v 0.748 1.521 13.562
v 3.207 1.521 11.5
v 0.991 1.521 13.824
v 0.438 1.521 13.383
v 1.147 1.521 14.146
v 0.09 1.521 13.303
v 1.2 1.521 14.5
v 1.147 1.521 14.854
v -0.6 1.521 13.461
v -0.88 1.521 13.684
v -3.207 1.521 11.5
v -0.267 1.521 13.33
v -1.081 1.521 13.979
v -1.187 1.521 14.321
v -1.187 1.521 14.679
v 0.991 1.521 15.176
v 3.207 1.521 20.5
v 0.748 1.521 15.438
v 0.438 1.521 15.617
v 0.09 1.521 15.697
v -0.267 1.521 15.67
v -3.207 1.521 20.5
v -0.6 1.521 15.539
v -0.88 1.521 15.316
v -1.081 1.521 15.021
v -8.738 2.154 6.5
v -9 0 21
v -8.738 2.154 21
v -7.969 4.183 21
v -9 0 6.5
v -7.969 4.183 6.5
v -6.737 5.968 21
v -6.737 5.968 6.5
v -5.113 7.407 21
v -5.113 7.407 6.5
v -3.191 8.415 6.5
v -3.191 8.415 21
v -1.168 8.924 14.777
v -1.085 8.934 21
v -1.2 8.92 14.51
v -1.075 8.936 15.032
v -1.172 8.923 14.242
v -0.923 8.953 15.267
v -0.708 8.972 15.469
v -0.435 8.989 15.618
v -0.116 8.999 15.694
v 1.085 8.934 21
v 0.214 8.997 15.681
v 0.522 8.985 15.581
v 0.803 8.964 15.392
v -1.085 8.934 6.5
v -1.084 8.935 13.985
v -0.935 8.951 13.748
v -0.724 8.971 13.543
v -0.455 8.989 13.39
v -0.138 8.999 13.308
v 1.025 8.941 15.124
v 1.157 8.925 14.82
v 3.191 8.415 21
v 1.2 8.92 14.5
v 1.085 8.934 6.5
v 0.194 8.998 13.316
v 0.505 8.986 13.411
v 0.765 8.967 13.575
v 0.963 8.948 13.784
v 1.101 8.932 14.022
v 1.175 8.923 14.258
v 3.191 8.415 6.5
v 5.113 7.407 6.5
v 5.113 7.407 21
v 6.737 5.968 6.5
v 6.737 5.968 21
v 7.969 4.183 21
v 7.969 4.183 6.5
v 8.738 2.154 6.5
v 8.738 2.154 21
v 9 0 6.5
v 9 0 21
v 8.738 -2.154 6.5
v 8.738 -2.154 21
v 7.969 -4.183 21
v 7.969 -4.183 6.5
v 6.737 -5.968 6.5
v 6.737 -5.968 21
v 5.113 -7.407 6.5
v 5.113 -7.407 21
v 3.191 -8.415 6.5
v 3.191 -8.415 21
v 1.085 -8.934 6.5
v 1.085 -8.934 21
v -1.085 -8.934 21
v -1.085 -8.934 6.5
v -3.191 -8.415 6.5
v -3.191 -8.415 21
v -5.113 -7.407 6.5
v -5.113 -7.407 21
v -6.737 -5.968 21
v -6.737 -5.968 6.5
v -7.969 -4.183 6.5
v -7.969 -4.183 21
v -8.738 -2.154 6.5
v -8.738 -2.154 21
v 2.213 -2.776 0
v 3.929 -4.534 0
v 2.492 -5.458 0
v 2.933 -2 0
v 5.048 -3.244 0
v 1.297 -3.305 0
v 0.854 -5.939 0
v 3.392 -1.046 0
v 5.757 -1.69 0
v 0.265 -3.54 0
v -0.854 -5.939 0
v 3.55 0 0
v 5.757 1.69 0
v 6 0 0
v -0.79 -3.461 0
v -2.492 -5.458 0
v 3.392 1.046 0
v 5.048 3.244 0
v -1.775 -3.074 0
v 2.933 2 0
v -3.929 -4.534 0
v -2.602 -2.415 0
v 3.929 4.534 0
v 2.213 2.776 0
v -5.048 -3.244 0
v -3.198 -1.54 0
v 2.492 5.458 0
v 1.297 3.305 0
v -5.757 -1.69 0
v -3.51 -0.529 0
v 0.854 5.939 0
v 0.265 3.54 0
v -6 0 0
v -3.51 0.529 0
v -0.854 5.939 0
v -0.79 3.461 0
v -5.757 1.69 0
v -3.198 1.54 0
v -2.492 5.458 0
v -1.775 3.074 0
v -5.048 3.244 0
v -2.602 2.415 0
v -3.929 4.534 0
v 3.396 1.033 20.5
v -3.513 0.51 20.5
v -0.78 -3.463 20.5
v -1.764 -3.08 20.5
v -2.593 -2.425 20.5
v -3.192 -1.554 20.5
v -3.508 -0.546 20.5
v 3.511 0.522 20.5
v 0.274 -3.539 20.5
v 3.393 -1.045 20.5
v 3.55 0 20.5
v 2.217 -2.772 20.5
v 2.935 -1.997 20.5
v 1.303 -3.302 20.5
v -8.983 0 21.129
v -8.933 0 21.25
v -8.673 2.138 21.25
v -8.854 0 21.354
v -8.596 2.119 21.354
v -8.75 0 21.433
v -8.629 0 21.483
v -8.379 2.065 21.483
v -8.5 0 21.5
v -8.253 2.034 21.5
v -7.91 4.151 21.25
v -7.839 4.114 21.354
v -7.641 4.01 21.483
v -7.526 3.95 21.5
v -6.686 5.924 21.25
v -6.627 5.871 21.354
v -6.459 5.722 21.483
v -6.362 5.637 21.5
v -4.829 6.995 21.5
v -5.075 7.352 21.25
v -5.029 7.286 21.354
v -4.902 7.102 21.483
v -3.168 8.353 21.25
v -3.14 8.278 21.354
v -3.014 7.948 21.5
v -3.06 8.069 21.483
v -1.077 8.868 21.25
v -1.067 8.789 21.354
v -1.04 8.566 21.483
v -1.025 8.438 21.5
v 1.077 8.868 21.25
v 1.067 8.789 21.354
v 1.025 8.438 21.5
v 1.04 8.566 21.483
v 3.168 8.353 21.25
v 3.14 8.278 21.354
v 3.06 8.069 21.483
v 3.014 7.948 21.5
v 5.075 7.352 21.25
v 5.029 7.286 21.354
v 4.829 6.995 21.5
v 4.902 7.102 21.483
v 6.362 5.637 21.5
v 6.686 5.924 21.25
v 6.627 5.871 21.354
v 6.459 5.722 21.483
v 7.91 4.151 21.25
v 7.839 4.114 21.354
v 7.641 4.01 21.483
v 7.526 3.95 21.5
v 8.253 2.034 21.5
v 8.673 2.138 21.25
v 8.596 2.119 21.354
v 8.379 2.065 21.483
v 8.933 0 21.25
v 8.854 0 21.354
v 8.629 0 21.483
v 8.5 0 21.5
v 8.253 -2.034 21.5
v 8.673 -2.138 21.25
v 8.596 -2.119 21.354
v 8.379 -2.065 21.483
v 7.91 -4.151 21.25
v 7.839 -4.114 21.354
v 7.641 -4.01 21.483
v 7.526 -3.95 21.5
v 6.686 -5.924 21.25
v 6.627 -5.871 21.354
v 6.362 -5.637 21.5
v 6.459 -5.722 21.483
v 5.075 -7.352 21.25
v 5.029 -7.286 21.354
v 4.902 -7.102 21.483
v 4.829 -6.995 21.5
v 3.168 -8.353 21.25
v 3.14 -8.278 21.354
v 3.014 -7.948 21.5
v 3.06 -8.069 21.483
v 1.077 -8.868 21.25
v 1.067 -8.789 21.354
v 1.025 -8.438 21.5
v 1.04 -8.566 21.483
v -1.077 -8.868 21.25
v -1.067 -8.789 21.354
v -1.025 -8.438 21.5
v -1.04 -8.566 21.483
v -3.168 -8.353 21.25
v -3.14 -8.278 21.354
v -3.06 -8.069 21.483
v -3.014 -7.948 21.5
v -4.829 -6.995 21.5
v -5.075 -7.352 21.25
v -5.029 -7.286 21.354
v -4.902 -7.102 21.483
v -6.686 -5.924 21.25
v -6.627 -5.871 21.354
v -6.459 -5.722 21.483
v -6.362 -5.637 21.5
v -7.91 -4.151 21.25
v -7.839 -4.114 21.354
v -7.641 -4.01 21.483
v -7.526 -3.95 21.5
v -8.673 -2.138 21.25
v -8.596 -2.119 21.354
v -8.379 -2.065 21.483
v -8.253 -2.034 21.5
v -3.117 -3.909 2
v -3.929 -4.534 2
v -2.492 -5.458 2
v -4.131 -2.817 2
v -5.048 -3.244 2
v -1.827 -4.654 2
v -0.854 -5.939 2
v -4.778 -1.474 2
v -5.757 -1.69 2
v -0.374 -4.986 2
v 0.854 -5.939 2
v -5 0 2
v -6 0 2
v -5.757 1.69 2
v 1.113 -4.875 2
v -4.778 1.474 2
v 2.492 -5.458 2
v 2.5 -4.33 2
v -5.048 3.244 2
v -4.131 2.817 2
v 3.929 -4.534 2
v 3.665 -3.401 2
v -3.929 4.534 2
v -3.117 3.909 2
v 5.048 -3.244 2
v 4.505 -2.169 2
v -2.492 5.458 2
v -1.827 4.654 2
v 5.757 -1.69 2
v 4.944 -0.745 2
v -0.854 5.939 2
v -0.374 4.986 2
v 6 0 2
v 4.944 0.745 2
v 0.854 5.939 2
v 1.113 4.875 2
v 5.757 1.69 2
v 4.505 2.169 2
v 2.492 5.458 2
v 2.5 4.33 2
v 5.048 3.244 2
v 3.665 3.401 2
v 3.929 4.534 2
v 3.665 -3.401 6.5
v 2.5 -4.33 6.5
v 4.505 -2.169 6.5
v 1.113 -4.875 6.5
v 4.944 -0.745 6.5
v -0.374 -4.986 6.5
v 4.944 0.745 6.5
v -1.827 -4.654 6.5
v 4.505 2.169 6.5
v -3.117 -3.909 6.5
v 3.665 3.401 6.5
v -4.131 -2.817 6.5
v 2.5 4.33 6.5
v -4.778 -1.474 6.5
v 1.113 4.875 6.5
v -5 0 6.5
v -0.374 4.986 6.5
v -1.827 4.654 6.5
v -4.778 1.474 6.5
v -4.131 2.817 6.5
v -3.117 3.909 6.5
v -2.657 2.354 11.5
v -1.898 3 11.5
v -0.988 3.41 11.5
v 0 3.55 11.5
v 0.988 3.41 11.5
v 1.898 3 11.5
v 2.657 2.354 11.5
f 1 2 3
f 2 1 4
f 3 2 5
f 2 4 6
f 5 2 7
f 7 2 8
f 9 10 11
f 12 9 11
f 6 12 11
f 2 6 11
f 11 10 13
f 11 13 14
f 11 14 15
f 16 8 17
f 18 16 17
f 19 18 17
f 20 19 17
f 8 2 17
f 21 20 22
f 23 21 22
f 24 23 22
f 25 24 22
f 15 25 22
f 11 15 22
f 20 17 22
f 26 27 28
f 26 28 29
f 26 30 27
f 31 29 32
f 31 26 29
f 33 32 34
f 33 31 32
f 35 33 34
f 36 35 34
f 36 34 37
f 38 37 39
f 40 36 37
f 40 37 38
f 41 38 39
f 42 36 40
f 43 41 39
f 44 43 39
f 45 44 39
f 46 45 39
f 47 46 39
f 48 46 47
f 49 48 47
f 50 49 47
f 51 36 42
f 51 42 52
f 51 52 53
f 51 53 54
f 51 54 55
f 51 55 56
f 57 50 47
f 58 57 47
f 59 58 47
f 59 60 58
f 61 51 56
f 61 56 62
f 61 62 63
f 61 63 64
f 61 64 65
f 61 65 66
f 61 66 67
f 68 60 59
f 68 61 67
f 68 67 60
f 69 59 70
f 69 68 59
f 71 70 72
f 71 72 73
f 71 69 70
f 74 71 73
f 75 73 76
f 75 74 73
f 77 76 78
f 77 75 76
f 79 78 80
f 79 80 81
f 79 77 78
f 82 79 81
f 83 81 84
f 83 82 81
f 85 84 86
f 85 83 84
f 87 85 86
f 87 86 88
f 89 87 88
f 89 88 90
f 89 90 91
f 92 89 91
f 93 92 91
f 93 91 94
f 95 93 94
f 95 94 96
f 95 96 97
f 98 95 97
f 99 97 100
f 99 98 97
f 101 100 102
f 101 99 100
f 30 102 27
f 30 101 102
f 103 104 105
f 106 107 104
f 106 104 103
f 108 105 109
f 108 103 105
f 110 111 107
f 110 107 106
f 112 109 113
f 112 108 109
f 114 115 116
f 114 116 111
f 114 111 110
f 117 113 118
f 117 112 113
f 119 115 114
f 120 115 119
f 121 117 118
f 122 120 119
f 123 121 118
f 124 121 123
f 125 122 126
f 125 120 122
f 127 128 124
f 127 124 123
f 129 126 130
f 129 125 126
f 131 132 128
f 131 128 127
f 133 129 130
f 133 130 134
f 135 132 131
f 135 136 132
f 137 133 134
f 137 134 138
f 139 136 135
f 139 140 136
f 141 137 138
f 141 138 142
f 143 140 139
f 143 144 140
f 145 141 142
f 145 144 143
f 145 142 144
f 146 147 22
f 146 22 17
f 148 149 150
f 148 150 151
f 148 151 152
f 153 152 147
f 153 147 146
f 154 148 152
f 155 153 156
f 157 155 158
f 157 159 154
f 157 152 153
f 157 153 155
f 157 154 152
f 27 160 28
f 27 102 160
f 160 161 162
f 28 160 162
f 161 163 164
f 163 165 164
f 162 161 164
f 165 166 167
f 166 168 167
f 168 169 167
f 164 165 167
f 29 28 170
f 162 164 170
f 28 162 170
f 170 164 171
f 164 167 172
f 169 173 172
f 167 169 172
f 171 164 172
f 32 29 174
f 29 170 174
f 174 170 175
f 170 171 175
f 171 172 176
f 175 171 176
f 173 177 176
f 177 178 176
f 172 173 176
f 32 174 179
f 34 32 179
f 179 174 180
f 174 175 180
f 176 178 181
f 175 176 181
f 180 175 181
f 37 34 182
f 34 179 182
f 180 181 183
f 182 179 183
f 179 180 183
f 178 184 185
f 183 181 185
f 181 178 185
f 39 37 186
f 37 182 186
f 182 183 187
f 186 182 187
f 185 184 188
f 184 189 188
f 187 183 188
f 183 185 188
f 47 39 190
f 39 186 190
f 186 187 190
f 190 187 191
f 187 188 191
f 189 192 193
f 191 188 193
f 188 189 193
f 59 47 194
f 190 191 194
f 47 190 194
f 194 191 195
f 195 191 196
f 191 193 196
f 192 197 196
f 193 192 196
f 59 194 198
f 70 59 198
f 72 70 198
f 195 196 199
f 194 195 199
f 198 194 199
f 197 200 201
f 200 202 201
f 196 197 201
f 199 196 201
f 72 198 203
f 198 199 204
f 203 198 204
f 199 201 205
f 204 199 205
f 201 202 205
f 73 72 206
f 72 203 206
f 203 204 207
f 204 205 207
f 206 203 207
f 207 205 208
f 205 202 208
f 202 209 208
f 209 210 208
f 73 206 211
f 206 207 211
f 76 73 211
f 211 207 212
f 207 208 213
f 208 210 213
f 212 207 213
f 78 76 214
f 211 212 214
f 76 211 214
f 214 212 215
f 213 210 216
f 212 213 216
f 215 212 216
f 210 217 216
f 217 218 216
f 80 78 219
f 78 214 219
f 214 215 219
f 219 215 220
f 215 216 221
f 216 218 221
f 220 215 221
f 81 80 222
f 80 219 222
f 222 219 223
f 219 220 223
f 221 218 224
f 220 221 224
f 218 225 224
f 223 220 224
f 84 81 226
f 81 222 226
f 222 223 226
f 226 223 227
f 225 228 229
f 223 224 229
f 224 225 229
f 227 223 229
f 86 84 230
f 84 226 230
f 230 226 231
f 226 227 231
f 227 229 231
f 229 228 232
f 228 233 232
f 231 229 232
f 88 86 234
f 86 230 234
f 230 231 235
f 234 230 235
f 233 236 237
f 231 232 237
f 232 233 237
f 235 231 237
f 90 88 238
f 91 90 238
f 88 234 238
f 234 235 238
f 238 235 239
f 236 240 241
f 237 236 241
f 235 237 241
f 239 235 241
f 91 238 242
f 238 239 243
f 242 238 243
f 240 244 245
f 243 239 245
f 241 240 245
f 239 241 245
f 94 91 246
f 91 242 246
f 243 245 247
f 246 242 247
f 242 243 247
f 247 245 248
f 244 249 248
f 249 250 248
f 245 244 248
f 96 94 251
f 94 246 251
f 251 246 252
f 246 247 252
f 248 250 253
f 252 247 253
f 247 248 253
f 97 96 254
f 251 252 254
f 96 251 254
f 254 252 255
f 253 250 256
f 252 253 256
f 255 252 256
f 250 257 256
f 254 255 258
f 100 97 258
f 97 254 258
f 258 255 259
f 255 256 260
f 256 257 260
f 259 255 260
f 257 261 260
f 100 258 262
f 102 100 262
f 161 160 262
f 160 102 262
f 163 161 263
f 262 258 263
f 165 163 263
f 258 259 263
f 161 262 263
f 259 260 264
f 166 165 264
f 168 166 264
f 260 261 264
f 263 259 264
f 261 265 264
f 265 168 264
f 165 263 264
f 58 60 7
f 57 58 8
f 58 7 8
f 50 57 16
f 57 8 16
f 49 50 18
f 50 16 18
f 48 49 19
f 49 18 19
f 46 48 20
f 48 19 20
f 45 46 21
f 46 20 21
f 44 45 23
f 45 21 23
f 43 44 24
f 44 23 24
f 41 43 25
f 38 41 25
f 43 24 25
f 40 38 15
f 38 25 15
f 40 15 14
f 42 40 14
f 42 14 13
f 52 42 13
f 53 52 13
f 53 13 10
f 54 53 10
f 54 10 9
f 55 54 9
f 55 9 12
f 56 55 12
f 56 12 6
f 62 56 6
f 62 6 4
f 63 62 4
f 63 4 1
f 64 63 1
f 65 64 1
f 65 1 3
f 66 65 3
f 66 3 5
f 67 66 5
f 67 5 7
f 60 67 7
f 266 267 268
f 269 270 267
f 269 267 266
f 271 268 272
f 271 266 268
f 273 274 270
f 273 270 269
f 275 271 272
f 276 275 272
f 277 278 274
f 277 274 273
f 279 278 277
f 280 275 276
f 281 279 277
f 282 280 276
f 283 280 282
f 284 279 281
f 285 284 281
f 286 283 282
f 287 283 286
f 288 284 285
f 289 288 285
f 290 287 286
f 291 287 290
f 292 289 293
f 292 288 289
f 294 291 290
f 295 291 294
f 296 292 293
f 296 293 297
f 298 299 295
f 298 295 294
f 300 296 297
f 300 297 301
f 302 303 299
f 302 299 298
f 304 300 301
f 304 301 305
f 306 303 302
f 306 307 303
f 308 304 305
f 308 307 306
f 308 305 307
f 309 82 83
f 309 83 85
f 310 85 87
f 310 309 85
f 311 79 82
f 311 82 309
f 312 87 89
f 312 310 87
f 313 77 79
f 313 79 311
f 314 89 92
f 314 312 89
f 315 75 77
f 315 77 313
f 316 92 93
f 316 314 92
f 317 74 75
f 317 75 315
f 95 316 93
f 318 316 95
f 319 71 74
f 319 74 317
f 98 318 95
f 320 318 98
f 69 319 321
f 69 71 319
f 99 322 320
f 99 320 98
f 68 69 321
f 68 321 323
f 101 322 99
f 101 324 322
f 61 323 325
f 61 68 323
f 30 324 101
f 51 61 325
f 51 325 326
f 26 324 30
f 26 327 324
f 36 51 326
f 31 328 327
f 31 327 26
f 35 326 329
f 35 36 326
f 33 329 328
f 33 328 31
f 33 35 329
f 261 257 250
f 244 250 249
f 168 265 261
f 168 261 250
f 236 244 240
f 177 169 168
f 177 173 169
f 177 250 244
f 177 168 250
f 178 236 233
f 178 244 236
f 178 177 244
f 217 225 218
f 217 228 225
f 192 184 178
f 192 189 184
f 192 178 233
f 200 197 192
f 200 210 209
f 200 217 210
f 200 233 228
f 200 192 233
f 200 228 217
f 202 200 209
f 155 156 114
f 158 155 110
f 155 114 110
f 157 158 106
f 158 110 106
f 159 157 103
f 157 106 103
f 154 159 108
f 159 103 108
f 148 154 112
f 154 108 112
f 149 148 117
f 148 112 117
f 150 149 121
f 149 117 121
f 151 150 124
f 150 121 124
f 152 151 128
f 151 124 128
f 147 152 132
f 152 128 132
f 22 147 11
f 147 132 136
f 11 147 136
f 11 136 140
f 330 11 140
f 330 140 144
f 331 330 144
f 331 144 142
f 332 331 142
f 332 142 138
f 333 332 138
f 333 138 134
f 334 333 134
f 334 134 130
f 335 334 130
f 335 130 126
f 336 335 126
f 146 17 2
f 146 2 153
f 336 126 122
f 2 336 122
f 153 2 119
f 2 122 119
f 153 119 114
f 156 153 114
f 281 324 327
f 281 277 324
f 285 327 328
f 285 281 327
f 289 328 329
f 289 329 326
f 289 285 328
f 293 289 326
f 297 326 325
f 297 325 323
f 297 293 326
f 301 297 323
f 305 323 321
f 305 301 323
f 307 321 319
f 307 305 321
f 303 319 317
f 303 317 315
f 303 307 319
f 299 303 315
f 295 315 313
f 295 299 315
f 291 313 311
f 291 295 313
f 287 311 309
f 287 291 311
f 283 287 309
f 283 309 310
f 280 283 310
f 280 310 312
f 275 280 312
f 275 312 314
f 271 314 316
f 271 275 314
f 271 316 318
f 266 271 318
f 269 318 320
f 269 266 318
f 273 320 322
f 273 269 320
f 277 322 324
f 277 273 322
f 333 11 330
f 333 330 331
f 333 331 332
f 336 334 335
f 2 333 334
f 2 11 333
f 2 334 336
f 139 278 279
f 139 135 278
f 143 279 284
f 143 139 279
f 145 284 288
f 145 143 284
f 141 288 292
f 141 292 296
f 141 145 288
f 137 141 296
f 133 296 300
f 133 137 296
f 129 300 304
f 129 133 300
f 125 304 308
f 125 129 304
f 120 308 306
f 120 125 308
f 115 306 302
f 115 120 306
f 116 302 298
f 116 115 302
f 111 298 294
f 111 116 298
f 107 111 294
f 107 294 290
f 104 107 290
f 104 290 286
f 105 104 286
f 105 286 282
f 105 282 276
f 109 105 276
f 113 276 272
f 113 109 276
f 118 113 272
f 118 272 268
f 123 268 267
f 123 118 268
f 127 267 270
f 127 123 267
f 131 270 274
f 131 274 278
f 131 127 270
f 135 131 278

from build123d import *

# Parameters (mm, degrees)
F2_R     = 3.55
F3_DEPTH = 20.5
F5_DEPTH = 9
F6_R     = 0.5
F7_R     = 1.2
F8_DEPTH = 25


with BuildPart() as f1:
    # F0 (on Front) → F1 (revolve)
    with BuildSketch(Plane.XZ):
        Polygon((-6, 0), (0, 0), (0, 21.5), (-9, 21.5), (-9, 6.5), (-5, 6.5), (-5, 2), (-6, 2), align=None)
    revolve(axis=Axis((0, 0, -3.667768), (0, 0, -1)))

    # F2 (on face) → F3 (cut)
    with BuildSketch(Plane(origin=(0, 0, 0), x_dir=(1, 0, 0), z_dir=(0, 0, -1))):
        Circle(F2_R)
    extrude(amount=-F3_DEPTH, mode=Mode.SUBTRACT)

    # F4 (on face) → F5 (join)
    with BuildSketch(Plane(origin=(0, 0, 20.5), x_dir=(1, 0, 0), z_dir=(0, 0, -1))):
        with BuildLine():
            Line((3.207453, -1.521429), (-3.207453, -1.521429))
            ThreePointArc((-3.207453, -1.521429), (0, -3.55), (3.207453, -1.521429))
        make_face()
    extrude(amount=F5_DEPTH)

    # F6
    f6_edges = [f1.edges().sort_by_distance(p)[0] for p in [
        (9, 0, 21.5),
    ]]
    fillet(f6_edges, radius=F6_R)

    # F7 (on face) → F8 (cut)
    with BuildSketch(Plane.XZ.offset(-1.521429)):
        with Locations((0, 14.5)):
            Circle(F7_R)
    extrude(amount=-F8_DEPTH, mode=Mode.SUBTRACT)


solid = f1.part
